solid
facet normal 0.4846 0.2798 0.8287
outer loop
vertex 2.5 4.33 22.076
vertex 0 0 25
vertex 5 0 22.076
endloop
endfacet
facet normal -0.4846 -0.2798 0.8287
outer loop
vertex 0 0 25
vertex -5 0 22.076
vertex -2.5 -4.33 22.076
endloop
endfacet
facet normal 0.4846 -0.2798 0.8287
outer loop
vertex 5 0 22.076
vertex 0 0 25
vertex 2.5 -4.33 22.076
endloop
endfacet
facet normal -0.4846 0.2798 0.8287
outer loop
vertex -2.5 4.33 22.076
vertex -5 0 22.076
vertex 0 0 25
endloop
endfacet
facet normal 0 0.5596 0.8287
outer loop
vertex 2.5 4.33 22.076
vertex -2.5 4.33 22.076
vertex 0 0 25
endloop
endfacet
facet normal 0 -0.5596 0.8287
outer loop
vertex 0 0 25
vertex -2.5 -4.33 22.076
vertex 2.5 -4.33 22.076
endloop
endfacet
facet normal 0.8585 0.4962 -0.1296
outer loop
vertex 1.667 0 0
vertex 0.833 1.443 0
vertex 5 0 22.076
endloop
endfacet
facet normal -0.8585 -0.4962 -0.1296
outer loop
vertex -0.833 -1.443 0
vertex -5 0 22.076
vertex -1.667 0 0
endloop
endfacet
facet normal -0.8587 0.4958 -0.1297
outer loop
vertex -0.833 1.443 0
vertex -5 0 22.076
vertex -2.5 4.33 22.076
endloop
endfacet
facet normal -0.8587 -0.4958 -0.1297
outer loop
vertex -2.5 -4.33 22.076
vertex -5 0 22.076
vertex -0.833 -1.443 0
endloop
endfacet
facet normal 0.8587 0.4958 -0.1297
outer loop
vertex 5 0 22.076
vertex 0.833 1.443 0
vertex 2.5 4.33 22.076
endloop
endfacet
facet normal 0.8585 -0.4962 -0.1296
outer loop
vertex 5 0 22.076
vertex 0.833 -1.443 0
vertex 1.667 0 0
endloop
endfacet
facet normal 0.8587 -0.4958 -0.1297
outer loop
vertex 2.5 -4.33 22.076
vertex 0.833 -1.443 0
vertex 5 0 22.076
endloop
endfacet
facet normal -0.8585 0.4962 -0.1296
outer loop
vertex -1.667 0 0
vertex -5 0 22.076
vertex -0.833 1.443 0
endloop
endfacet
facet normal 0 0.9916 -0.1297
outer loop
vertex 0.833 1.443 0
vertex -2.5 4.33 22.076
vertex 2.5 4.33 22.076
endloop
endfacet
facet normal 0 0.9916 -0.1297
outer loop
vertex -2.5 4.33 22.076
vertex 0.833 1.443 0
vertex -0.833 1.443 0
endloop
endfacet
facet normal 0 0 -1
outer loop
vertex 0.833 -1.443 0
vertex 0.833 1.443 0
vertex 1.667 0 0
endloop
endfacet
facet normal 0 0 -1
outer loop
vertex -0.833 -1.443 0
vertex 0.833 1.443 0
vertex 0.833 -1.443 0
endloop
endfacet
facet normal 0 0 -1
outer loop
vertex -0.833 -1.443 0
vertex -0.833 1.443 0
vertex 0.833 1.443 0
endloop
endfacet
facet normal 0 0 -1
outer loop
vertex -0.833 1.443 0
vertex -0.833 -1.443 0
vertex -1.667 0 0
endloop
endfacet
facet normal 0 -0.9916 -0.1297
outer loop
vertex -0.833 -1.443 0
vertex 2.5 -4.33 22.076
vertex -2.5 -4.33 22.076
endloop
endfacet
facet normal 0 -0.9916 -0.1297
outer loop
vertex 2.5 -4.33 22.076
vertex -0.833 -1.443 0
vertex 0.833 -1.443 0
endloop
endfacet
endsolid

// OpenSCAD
/** thorn
 * 
 *  This module creates a single crystal thorn pointing upwards
 *  
 *  height      total thorn height
 *  circumr     radius of thorn widest point
 *  seg         number of thorn segments 
 *
 */
module thorn(
    height  = 15,
    circumr = 3,
    seg     = 5
) {
    // height of the upper stump is third root of total height
    stump_height    = pow( height, 1/3 );
    base_height     = height - stump_height;
    // translated upper stump
    translate( [0,0,base_height] )
        cylinder( r1=circumr, r2=0, h=stump_height, $fn=seg );
    // thorn base
    cylinder( r1=circumr/3, r2=circumr, h=base_height, $fn=seg );
}


thorn( 25, 5, 6 );
